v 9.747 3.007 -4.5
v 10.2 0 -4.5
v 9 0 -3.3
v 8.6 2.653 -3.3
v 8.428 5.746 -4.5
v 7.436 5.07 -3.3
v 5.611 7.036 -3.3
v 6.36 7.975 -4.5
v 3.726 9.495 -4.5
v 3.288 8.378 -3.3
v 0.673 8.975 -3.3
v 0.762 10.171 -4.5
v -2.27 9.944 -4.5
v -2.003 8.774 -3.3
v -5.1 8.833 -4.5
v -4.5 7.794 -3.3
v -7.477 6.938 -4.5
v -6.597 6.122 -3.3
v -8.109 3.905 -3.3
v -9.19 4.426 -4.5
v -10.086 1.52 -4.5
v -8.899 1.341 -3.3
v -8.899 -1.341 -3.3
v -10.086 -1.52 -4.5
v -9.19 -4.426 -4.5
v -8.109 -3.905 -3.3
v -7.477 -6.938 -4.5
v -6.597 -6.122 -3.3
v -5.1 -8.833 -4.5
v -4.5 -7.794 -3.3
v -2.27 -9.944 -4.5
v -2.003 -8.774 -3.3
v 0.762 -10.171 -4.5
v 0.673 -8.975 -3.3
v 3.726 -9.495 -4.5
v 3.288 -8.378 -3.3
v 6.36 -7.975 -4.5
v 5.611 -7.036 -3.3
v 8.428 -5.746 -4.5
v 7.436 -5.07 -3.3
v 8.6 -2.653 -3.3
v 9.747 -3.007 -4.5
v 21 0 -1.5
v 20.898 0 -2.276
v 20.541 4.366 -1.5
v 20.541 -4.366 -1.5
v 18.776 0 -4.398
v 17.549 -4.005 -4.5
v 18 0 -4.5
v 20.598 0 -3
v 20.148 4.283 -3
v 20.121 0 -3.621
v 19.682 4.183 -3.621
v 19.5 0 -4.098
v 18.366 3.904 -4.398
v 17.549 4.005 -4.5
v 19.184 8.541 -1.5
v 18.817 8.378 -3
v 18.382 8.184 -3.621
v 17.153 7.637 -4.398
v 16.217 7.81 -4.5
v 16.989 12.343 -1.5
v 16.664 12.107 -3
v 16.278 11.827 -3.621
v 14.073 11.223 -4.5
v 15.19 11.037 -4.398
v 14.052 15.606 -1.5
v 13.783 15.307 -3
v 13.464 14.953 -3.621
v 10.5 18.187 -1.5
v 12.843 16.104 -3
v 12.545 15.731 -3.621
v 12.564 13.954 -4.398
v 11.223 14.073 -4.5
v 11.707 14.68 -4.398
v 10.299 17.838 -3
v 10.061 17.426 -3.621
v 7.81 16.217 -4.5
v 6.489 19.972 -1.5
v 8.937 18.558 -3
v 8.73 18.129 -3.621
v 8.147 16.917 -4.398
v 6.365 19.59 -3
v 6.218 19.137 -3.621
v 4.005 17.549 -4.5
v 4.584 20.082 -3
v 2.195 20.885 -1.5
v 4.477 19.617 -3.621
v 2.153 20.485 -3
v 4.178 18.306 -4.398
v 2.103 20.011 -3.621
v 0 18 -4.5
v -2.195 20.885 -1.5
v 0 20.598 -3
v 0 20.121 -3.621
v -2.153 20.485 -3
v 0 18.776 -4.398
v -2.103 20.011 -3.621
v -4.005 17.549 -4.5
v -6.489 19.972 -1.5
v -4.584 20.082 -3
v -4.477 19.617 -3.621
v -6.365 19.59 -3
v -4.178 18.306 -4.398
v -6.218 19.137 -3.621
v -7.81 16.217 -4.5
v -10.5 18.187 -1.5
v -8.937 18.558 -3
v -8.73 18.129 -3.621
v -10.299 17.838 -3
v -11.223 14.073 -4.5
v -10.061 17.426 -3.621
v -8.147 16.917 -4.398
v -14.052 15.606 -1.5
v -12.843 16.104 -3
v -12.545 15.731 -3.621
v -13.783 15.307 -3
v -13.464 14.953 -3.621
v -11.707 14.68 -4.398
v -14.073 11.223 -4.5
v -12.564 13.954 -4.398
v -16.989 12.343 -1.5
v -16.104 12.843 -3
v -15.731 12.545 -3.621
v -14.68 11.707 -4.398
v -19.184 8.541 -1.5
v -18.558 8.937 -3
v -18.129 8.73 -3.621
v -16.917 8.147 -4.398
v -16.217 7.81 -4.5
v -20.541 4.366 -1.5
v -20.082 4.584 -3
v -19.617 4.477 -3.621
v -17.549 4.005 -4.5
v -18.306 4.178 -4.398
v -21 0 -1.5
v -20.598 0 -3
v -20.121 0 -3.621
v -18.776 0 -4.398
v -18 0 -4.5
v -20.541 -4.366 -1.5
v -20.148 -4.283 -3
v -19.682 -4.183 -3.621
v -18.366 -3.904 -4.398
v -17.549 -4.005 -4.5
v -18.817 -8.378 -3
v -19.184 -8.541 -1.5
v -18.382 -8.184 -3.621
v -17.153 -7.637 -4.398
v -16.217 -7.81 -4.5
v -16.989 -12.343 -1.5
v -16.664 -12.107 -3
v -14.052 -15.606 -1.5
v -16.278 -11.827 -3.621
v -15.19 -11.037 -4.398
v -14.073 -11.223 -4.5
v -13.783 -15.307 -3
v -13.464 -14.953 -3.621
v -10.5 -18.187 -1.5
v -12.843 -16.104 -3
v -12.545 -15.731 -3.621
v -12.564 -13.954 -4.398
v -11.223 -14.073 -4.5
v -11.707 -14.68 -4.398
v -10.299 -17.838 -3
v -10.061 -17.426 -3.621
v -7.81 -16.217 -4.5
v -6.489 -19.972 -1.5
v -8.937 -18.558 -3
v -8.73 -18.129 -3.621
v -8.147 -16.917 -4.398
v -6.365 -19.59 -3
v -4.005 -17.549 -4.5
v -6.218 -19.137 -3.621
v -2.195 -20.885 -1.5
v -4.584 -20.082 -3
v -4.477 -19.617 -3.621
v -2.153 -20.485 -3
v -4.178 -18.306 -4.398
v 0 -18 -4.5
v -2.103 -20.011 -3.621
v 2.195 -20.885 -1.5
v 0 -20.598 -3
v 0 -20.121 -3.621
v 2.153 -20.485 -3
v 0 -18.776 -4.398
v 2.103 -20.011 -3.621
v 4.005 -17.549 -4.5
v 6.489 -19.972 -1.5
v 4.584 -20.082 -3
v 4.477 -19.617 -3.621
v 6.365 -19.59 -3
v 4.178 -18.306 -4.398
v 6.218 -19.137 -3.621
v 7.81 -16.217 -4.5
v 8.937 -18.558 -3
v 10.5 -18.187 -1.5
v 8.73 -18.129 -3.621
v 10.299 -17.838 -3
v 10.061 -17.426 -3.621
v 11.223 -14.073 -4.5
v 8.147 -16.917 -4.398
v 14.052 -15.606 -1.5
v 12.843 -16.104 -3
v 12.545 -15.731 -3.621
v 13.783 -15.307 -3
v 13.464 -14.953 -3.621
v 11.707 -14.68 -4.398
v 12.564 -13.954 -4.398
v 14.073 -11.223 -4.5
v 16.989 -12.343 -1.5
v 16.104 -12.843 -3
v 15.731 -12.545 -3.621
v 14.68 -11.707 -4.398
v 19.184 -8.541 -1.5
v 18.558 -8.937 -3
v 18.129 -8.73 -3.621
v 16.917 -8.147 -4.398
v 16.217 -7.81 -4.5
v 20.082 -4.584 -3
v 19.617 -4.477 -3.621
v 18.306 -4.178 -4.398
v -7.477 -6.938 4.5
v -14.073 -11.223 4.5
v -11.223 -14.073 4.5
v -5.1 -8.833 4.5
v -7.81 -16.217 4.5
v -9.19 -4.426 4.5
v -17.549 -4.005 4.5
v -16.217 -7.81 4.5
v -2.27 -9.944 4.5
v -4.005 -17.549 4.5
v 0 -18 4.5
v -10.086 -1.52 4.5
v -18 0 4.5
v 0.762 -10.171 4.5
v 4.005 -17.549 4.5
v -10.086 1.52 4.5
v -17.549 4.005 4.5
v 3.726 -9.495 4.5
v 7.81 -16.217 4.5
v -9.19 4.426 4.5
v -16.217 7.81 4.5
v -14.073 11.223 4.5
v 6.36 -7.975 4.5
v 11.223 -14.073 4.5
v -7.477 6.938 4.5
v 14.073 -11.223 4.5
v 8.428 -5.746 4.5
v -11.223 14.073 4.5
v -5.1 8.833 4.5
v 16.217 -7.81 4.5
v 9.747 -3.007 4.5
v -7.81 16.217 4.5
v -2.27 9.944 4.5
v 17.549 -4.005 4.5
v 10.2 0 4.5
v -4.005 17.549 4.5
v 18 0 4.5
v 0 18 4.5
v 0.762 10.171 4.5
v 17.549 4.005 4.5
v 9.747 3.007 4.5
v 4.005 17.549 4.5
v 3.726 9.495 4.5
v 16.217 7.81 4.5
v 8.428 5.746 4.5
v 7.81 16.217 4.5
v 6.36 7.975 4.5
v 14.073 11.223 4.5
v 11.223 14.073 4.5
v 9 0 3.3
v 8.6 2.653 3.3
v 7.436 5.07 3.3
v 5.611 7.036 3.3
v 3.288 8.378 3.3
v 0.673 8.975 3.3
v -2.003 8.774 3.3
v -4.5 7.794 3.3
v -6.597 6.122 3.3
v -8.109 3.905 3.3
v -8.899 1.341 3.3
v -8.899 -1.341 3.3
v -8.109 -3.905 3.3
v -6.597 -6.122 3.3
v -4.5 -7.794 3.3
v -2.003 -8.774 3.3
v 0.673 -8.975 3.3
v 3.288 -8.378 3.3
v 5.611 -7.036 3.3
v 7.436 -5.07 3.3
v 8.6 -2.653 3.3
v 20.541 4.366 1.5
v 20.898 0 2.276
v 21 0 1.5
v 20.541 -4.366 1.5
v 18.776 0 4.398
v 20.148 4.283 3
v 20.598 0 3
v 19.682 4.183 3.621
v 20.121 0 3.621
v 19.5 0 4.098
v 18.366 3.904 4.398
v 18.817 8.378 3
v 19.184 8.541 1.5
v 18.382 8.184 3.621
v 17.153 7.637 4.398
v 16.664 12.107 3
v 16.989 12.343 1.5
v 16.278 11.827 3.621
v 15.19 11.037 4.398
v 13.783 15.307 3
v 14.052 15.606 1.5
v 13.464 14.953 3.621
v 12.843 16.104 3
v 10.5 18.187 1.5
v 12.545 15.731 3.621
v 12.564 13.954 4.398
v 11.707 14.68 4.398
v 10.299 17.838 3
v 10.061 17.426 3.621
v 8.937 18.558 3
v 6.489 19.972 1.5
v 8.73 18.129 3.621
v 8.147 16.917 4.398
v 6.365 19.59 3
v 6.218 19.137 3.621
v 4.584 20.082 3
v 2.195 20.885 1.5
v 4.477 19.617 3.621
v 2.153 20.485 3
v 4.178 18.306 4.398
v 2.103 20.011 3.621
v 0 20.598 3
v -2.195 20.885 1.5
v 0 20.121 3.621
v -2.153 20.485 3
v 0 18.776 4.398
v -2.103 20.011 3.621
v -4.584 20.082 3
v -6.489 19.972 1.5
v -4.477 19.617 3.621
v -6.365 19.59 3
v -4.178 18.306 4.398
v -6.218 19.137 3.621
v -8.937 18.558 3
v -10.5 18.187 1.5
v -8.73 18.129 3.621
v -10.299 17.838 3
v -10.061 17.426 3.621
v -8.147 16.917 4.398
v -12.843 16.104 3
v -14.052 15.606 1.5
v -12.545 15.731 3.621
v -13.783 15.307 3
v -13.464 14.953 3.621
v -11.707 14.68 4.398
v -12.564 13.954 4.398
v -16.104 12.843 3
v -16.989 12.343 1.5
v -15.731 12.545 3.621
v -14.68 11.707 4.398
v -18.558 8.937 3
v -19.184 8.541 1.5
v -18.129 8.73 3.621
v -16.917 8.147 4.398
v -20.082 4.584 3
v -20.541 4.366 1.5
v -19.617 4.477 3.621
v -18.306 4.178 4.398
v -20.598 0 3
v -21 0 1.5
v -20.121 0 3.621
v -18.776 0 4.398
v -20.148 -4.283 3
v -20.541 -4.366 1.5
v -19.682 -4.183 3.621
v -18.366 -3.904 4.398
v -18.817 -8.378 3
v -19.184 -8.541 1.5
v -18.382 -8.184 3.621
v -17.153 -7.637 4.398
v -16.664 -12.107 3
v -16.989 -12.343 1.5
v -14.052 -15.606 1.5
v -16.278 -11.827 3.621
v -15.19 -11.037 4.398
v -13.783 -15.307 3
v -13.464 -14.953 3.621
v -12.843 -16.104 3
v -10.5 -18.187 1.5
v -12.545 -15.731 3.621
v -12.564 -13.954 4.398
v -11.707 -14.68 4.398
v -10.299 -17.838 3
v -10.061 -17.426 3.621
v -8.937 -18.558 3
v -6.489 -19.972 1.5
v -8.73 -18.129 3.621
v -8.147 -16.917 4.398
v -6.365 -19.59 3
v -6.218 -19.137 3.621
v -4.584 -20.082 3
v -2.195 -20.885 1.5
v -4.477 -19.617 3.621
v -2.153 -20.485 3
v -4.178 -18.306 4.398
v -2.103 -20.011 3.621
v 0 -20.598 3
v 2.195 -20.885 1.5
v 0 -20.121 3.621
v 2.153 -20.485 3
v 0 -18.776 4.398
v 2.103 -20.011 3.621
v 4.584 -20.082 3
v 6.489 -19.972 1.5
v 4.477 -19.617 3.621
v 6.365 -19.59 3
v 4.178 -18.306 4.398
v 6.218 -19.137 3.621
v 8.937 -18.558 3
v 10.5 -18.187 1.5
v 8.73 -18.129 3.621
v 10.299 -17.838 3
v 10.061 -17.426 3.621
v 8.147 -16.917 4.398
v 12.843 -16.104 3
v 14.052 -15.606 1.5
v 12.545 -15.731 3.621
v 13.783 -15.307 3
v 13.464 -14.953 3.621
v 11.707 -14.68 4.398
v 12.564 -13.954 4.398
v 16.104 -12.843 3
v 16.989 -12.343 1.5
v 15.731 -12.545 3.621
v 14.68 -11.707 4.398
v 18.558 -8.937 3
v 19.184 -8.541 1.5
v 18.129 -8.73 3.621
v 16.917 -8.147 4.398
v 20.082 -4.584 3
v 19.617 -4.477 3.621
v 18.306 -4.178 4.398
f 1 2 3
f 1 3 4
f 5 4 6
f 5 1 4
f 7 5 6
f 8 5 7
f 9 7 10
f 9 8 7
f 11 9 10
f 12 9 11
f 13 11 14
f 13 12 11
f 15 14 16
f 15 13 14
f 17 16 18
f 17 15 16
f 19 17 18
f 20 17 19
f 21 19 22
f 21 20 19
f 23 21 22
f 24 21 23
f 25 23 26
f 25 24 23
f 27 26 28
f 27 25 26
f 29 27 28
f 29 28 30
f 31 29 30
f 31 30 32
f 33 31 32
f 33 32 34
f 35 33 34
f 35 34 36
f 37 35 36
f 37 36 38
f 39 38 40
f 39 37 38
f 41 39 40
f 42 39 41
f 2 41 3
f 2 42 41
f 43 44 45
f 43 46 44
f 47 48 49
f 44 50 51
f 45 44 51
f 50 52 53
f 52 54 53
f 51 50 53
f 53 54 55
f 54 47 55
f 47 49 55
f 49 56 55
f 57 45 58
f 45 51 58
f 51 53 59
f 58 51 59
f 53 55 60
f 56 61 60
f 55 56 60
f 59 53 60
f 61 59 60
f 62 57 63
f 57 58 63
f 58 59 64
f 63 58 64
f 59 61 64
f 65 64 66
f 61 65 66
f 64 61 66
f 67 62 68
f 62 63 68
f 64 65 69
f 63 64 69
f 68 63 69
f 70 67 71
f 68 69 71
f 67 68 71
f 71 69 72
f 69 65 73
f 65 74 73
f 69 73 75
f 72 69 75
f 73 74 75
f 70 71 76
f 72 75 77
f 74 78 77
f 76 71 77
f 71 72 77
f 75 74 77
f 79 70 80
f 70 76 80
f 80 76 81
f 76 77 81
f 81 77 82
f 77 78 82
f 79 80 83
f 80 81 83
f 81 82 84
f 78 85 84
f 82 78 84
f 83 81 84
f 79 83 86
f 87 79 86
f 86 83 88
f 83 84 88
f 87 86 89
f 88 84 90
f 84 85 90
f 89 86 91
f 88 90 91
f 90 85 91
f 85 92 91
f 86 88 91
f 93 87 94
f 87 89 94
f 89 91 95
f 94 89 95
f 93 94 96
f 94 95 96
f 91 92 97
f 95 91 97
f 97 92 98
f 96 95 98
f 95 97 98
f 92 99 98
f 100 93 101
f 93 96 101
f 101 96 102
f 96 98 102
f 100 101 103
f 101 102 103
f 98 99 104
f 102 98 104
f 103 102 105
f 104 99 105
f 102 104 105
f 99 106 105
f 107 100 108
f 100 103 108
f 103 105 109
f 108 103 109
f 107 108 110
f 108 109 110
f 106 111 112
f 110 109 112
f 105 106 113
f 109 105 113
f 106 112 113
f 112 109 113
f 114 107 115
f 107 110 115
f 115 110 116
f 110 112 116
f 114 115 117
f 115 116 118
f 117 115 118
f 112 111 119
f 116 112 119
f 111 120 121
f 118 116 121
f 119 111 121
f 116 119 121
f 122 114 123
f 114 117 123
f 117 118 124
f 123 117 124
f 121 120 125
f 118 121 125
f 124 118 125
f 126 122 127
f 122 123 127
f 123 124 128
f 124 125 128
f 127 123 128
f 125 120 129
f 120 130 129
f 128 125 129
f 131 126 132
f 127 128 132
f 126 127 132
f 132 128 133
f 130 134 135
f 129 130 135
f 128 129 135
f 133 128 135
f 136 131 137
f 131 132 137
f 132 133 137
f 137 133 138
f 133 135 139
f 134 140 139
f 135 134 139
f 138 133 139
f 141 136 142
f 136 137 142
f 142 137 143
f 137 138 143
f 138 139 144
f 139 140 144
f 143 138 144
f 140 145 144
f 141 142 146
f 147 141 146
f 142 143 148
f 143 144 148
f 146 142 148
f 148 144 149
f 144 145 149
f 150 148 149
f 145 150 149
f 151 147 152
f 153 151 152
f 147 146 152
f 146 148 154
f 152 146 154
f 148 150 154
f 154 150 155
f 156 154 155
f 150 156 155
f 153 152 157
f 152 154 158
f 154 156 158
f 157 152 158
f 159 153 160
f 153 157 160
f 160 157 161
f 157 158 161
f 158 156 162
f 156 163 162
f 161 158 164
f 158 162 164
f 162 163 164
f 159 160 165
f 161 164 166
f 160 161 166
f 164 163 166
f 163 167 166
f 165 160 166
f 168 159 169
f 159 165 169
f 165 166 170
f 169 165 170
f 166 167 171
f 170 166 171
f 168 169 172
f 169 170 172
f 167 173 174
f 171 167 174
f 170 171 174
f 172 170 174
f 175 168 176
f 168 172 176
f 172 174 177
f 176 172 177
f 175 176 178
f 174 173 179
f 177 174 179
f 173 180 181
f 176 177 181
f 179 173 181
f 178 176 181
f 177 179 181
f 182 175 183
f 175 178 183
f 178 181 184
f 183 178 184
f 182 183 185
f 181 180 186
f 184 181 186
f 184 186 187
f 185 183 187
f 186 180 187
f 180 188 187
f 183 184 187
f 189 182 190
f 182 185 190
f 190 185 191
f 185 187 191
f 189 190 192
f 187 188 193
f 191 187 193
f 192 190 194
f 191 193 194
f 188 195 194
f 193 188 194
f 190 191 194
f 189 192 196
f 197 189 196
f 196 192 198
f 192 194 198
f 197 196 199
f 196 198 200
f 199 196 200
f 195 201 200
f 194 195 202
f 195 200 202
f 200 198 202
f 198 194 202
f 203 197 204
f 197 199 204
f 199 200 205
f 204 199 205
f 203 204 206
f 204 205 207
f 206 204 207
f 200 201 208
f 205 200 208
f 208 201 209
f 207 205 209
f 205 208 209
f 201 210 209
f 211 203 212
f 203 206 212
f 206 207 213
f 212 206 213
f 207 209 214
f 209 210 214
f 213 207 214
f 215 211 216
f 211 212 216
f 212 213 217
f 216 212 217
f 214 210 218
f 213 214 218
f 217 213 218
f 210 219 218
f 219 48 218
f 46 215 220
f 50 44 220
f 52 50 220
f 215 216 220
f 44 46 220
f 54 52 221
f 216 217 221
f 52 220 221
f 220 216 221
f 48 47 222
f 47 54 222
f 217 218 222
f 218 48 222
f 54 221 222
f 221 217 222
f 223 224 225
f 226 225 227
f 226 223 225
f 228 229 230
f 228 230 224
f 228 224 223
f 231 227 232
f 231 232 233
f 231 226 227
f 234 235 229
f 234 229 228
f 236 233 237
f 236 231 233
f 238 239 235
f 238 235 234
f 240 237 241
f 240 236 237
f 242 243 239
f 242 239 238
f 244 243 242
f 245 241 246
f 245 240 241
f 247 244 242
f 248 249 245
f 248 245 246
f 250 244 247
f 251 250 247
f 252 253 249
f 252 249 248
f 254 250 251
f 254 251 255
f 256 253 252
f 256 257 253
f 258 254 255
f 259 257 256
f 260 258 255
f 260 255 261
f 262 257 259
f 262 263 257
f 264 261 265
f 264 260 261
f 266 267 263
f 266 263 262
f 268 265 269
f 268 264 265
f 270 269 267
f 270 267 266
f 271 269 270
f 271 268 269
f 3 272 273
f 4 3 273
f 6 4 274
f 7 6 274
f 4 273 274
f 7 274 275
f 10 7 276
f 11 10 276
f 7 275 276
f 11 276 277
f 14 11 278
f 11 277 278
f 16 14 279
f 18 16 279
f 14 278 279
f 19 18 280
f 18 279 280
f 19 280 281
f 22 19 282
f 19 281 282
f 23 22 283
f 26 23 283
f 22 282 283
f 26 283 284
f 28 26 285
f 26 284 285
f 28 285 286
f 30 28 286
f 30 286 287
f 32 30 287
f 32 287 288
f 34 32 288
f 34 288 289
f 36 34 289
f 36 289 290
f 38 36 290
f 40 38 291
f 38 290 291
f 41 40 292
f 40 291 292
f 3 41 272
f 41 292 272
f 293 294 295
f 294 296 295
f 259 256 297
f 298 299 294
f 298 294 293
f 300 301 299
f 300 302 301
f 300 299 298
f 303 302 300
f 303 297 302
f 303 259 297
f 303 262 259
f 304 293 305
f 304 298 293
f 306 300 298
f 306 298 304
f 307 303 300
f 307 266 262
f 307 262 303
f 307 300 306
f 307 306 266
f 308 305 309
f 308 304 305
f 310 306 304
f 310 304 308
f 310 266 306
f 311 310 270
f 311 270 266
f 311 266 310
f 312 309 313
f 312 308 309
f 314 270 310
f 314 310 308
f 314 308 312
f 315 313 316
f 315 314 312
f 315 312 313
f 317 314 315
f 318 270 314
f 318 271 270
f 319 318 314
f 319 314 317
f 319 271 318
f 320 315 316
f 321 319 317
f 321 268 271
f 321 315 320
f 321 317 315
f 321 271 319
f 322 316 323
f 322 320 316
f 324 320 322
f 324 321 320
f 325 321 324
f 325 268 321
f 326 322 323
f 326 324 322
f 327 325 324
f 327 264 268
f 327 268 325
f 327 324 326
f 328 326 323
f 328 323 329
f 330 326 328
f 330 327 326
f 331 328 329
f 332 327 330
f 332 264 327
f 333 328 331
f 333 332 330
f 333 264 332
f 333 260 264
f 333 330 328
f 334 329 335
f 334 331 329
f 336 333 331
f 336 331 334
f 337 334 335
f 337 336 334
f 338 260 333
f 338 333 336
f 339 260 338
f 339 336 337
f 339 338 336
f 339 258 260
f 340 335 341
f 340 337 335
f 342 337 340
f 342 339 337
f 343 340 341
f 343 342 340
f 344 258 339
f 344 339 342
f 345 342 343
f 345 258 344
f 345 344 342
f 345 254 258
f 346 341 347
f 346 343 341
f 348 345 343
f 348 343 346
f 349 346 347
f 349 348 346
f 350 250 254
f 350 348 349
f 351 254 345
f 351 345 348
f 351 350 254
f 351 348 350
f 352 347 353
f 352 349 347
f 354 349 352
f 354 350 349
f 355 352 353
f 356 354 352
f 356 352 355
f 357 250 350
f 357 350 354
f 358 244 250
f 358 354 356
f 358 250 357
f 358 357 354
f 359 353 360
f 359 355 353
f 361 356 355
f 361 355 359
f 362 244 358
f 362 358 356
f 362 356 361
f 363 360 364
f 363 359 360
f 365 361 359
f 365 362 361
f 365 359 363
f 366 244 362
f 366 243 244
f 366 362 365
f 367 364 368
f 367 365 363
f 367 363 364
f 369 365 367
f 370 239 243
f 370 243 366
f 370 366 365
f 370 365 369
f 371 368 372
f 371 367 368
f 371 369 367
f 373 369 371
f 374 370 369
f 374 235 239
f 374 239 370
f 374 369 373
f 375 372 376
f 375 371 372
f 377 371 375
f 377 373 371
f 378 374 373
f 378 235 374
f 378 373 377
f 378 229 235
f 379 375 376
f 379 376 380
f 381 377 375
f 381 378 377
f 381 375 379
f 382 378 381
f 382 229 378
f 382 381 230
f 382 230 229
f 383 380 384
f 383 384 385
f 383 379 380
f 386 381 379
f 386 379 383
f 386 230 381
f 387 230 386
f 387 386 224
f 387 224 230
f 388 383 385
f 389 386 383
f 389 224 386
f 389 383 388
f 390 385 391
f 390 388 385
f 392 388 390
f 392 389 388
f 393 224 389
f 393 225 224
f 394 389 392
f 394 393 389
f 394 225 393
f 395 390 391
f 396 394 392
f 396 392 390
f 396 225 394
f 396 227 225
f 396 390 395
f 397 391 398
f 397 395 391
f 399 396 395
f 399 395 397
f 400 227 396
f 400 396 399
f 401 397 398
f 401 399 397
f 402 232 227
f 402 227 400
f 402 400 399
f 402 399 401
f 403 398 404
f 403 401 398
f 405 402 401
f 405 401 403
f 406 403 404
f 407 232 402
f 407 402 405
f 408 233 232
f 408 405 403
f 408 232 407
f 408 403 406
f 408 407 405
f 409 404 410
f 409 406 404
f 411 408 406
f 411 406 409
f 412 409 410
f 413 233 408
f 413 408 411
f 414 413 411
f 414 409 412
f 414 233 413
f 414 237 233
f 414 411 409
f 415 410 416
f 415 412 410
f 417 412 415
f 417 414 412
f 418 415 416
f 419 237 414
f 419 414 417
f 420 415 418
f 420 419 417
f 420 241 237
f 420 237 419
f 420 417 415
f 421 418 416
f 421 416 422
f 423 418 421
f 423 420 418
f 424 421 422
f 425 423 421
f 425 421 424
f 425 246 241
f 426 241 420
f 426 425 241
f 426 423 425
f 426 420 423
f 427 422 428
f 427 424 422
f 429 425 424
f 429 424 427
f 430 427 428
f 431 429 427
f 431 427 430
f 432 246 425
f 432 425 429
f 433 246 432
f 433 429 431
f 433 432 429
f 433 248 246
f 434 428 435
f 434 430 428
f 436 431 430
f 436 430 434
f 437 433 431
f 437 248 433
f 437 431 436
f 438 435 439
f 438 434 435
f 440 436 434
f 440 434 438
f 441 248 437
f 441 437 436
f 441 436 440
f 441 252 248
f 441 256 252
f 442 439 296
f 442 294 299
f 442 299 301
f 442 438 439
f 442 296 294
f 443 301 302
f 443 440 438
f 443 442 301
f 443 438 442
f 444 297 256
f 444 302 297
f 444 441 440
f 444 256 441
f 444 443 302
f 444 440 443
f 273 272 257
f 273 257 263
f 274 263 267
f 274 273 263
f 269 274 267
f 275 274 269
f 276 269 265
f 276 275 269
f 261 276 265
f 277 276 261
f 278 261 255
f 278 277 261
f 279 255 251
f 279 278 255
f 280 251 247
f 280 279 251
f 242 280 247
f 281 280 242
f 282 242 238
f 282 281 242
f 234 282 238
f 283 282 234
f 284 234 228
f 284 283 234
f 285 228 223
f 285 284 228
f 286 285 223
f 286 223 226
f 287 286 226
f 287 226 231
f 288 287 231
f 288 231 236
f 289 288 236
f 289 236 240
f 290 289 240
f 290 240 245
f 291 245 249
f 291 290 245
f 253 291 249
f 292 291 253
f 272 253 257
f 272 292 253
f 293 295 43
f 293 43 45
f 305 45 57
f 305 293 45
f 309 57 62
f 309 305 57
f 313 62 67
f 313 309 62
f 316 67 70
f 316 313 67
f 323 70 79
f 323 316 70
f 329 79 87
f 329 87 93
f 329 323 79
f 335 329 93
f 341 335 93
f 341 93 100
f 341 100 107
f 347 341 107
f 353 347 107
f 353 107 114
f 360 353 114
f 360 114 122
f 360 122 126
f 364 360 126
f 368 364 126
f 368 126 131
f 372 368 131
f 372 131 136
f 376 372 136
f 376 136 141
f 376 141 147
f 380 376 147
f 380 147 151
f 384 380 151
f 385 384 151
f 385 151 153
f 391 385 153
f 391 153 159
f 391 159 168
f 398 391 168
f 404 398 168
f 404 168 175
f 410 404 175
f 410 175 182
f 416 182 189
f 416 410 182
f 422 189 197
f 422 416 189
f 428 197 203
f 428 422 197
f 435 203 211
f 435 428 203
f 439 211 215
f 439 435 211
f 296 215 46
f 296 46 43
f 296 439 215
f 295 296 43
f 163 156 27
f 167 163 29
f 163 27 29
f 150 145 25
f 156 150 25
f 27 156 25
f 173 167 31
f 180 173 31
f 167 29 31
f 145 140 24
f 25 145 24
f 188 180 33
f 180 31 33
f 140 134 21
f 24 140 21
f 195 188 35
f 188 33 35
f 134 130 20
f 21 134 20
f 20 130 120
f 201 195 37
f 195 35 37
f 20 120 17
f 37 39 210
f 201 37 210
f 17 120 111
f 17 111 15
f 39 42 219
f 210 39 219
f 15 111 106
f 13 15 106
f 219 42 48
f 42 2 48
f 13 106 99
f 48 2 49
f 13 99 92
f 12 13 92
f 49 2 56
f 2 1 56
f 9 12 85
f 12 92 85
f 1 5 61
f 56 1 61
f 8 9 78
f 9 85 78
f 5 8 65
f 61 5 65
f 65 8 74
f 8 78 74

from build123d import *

# Parameters (mm, degrees)
SKETCH_1_R          = 35
EXTRUDE_1_DEPTH     = 7.5
FILLET_1_R          = 5
FILLET_2_R          = 5
SKETCH_2_R          = 15
CUT_EXTRUDE_1_DEPTH = 15
CHAMFER_1_SIZE      = 2
CHAMFER_2_SIZE      = 2
SCALE_1_SCALE       = 0.6


with BuildPart() as part:
    # 草图1 → 凸台-拉伸1 (new, symmetric)
    with BuildSketch(Plane.XY):
        Circle(SKETCH_1_R)
    extrude(amount=EXTRUDE_1_DEPTH, both=True)

    # 圆角1
    fillet_1_edges = [part.edges().sort_by_distance(p)[0] for p in [
        (-35, 0, 7.5),
    ]]
    fillet(fillet_1_edges, radius=FILLET_1_R)

    # 圆角2
    fillet_2_edges = [part.edges().sort_by_distance(p)[0] for p in [
        (-35, 0, -7.5),
    ]]
    fillet(fillet_2_edges, radius=FILLET_2_R)

    # 草图2 → 切除-拉伸1 (cut)
    with BuildSketch(Plane.XY.offset(7.5)):
        Circle(SKETCH_2_R)
    extrude(amount=-CUT_EXTRUDE_1_DEPTH, mode=Mode.SUBTRACT)

    # 倒角1
    chamfer_1_edges = [part.edges().sort_by_distance(p)[0] for p in [
        (-15, 0, 7.5),
    ]]
    chamfer(chamfer_1_edges, length=CHAMFER_1_SIZE)

    # 倒角2
    chamfer_2_edges = [part.edges().sort_by_distance(p)[0] for p in [
        (-15, 0, -7.5),
    ]]
    chamfer(chamfer_2_edges, length=CHAMFER_2_SIZE)


with BuildPart() as part_1:
    # 缩放比例1: scaled about (0, 0, 0)
    add(part.part.scale(SCALE_1_SCALE))


solid = part_1.part
